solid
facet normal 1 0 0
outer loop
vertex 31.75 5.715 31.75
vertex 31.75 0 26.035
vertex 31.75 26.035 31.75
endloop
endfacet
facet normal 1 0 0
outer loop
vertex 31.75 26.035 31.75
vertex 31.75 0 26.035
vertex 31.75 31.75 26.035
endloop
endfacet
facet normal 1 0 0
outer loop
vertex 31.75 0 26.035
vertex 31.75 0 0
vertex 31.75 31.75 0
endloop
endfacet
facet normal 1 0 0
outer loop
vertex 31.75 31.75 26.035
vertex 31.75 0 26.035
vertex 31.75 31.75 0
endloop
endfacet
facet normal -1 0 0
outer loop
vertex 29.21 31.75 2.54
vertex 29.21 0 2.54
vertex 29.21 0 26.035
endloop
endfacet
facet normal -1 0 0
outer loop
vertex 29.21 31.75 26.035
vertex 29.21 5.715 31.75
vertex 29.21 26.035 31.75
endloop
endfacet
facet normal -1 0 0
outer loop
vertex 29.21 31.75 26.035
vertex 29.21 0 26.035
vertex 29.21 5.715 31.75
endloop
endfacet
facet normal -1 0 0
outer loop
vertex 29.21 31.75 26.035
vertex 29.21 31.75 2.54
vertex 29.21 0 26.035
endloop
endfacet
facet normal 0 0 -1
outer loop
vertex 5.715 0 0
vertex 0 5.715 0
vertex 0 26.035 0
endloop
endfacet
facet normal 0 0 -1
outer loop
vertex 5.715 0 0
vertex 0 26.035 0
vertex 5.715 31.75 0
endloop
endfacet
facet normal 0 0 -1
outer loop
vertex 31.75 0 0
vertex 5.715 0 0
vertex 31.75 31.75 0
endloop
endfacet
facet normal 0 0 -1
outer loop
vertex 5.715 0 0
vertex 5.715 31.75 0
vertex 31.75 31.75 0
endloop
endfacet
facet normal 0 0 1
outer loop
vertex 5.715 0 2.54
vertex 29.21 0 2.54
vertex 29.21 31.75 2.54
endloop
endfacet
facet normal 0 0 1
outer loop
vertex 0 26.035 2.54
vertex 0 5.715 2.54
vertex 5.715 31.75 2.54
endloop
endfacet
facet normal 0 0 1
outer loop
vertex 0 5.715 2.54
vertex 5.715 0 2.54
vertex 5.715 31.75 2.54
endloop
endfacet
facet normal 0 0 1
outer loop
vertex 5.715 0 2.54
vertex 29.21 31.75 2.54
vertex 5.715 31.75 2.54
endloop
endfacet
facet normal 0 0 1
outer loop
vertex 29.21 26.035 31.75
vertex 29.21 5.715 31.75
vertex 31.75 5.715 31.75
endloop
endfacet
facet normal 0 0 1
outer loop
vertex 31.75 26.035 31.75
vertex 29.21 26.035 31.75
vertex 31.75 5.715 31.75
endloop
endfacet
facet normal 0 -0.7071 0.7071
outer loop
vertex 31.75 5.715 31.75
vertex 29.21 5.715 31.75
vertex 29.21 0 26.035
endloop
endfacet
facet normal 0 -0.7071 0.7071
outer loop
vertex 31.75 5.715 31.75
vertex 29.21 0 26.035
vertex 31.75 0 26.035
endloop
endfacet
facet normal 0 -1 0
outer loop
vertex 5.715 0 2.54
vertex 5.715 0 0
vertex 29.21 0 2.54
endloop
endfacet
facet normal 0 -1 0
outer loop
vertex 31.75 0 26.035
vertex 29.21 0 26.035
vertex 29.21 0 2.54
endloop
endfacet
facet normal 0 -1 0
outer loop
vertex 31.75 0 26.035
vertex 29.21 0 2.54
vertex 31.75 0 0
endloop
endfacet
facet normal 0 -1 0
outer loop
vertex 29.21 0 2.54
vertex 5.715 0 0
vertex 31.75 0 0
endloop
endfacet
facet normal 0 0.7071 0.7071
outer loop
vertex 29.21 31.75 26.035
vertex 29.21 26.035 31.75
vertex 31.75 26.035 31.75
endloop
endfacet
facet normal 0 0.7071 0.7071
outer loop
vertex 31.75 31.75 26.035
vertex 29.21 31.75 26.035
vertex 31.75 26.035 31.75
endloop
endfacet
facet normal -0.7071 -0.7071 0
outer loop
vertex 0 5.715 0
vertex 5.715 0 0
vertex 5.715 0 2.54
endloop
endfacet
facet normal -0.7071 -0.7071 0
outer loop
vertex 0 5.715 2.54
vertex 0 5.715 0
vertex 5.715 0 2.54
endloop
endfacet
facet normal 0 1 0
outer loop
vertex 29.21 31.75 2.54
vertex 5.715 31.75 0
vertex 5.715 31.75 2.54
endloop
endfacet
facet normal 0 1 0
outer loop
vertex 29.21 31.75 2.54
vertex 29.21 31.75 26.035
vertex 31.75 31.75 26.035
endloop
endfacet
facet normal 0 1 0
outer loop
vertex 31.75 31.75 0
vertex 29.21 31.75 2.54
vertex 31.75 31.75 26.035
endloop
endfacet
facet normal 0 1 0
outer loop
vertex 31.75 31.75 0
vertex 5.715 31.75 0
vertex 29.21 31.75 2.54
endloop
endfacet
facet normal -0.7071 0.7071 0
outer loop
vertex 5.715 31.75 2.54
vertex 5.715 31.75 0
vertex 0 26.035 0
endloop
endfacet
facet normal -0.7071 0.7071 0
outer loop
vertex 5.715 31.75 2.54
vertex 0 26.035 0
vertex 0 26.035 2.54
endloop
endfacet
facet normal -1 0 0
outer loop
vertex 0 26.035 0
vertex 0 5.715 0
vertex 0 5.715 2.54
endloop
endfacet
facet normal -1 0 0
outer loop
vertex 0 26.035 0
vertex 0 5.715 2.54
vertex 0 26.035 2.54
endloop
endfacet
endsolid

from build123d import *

# Parameters (mm, degrees)
F0_W     = 31.75
F0_H     = 31.75
F1_DEPTH = 31.75
F2_W     = 29.21
F2_H     = 29.21
F3_DEPTH = 31.75
F4_SIZE  = 5.715


with BuildPart() as f1:
    # F0 (on Top) → F1 (new body)
    with BuildSketch(Plane.XY):
        with Locations((15.875, 15.875)):
            Rectangle(F0_W, F0_H)
    extrude(amount=F1_DEPTH)

    # F2 (on face) → F3 (cut, through all)
    with BuildSketch(Plane(origin=(0, 31.75, 0), x_dir=(-1, 0, 0), z_dir=(0, 1, 0))):
        with Locations((-14.605, 17.145)):
            Rectangle(F2_W, F2_H)
    extrude(amount=-F3_DEPTH, mode=Mode.SUBTRACT)

    # F4
    f4_edges = [f1.edges().sort_by_distance(p)[0] for p in [
        (30.48, 31.75, 31.75),
        (30.48, 0, 31.75),
        (0, 0, 1.27),
        (0, 31.75, 1.27),
    ]]
    chamfer(f4_edges, length=F4_SIZE)


solid = f1.part
